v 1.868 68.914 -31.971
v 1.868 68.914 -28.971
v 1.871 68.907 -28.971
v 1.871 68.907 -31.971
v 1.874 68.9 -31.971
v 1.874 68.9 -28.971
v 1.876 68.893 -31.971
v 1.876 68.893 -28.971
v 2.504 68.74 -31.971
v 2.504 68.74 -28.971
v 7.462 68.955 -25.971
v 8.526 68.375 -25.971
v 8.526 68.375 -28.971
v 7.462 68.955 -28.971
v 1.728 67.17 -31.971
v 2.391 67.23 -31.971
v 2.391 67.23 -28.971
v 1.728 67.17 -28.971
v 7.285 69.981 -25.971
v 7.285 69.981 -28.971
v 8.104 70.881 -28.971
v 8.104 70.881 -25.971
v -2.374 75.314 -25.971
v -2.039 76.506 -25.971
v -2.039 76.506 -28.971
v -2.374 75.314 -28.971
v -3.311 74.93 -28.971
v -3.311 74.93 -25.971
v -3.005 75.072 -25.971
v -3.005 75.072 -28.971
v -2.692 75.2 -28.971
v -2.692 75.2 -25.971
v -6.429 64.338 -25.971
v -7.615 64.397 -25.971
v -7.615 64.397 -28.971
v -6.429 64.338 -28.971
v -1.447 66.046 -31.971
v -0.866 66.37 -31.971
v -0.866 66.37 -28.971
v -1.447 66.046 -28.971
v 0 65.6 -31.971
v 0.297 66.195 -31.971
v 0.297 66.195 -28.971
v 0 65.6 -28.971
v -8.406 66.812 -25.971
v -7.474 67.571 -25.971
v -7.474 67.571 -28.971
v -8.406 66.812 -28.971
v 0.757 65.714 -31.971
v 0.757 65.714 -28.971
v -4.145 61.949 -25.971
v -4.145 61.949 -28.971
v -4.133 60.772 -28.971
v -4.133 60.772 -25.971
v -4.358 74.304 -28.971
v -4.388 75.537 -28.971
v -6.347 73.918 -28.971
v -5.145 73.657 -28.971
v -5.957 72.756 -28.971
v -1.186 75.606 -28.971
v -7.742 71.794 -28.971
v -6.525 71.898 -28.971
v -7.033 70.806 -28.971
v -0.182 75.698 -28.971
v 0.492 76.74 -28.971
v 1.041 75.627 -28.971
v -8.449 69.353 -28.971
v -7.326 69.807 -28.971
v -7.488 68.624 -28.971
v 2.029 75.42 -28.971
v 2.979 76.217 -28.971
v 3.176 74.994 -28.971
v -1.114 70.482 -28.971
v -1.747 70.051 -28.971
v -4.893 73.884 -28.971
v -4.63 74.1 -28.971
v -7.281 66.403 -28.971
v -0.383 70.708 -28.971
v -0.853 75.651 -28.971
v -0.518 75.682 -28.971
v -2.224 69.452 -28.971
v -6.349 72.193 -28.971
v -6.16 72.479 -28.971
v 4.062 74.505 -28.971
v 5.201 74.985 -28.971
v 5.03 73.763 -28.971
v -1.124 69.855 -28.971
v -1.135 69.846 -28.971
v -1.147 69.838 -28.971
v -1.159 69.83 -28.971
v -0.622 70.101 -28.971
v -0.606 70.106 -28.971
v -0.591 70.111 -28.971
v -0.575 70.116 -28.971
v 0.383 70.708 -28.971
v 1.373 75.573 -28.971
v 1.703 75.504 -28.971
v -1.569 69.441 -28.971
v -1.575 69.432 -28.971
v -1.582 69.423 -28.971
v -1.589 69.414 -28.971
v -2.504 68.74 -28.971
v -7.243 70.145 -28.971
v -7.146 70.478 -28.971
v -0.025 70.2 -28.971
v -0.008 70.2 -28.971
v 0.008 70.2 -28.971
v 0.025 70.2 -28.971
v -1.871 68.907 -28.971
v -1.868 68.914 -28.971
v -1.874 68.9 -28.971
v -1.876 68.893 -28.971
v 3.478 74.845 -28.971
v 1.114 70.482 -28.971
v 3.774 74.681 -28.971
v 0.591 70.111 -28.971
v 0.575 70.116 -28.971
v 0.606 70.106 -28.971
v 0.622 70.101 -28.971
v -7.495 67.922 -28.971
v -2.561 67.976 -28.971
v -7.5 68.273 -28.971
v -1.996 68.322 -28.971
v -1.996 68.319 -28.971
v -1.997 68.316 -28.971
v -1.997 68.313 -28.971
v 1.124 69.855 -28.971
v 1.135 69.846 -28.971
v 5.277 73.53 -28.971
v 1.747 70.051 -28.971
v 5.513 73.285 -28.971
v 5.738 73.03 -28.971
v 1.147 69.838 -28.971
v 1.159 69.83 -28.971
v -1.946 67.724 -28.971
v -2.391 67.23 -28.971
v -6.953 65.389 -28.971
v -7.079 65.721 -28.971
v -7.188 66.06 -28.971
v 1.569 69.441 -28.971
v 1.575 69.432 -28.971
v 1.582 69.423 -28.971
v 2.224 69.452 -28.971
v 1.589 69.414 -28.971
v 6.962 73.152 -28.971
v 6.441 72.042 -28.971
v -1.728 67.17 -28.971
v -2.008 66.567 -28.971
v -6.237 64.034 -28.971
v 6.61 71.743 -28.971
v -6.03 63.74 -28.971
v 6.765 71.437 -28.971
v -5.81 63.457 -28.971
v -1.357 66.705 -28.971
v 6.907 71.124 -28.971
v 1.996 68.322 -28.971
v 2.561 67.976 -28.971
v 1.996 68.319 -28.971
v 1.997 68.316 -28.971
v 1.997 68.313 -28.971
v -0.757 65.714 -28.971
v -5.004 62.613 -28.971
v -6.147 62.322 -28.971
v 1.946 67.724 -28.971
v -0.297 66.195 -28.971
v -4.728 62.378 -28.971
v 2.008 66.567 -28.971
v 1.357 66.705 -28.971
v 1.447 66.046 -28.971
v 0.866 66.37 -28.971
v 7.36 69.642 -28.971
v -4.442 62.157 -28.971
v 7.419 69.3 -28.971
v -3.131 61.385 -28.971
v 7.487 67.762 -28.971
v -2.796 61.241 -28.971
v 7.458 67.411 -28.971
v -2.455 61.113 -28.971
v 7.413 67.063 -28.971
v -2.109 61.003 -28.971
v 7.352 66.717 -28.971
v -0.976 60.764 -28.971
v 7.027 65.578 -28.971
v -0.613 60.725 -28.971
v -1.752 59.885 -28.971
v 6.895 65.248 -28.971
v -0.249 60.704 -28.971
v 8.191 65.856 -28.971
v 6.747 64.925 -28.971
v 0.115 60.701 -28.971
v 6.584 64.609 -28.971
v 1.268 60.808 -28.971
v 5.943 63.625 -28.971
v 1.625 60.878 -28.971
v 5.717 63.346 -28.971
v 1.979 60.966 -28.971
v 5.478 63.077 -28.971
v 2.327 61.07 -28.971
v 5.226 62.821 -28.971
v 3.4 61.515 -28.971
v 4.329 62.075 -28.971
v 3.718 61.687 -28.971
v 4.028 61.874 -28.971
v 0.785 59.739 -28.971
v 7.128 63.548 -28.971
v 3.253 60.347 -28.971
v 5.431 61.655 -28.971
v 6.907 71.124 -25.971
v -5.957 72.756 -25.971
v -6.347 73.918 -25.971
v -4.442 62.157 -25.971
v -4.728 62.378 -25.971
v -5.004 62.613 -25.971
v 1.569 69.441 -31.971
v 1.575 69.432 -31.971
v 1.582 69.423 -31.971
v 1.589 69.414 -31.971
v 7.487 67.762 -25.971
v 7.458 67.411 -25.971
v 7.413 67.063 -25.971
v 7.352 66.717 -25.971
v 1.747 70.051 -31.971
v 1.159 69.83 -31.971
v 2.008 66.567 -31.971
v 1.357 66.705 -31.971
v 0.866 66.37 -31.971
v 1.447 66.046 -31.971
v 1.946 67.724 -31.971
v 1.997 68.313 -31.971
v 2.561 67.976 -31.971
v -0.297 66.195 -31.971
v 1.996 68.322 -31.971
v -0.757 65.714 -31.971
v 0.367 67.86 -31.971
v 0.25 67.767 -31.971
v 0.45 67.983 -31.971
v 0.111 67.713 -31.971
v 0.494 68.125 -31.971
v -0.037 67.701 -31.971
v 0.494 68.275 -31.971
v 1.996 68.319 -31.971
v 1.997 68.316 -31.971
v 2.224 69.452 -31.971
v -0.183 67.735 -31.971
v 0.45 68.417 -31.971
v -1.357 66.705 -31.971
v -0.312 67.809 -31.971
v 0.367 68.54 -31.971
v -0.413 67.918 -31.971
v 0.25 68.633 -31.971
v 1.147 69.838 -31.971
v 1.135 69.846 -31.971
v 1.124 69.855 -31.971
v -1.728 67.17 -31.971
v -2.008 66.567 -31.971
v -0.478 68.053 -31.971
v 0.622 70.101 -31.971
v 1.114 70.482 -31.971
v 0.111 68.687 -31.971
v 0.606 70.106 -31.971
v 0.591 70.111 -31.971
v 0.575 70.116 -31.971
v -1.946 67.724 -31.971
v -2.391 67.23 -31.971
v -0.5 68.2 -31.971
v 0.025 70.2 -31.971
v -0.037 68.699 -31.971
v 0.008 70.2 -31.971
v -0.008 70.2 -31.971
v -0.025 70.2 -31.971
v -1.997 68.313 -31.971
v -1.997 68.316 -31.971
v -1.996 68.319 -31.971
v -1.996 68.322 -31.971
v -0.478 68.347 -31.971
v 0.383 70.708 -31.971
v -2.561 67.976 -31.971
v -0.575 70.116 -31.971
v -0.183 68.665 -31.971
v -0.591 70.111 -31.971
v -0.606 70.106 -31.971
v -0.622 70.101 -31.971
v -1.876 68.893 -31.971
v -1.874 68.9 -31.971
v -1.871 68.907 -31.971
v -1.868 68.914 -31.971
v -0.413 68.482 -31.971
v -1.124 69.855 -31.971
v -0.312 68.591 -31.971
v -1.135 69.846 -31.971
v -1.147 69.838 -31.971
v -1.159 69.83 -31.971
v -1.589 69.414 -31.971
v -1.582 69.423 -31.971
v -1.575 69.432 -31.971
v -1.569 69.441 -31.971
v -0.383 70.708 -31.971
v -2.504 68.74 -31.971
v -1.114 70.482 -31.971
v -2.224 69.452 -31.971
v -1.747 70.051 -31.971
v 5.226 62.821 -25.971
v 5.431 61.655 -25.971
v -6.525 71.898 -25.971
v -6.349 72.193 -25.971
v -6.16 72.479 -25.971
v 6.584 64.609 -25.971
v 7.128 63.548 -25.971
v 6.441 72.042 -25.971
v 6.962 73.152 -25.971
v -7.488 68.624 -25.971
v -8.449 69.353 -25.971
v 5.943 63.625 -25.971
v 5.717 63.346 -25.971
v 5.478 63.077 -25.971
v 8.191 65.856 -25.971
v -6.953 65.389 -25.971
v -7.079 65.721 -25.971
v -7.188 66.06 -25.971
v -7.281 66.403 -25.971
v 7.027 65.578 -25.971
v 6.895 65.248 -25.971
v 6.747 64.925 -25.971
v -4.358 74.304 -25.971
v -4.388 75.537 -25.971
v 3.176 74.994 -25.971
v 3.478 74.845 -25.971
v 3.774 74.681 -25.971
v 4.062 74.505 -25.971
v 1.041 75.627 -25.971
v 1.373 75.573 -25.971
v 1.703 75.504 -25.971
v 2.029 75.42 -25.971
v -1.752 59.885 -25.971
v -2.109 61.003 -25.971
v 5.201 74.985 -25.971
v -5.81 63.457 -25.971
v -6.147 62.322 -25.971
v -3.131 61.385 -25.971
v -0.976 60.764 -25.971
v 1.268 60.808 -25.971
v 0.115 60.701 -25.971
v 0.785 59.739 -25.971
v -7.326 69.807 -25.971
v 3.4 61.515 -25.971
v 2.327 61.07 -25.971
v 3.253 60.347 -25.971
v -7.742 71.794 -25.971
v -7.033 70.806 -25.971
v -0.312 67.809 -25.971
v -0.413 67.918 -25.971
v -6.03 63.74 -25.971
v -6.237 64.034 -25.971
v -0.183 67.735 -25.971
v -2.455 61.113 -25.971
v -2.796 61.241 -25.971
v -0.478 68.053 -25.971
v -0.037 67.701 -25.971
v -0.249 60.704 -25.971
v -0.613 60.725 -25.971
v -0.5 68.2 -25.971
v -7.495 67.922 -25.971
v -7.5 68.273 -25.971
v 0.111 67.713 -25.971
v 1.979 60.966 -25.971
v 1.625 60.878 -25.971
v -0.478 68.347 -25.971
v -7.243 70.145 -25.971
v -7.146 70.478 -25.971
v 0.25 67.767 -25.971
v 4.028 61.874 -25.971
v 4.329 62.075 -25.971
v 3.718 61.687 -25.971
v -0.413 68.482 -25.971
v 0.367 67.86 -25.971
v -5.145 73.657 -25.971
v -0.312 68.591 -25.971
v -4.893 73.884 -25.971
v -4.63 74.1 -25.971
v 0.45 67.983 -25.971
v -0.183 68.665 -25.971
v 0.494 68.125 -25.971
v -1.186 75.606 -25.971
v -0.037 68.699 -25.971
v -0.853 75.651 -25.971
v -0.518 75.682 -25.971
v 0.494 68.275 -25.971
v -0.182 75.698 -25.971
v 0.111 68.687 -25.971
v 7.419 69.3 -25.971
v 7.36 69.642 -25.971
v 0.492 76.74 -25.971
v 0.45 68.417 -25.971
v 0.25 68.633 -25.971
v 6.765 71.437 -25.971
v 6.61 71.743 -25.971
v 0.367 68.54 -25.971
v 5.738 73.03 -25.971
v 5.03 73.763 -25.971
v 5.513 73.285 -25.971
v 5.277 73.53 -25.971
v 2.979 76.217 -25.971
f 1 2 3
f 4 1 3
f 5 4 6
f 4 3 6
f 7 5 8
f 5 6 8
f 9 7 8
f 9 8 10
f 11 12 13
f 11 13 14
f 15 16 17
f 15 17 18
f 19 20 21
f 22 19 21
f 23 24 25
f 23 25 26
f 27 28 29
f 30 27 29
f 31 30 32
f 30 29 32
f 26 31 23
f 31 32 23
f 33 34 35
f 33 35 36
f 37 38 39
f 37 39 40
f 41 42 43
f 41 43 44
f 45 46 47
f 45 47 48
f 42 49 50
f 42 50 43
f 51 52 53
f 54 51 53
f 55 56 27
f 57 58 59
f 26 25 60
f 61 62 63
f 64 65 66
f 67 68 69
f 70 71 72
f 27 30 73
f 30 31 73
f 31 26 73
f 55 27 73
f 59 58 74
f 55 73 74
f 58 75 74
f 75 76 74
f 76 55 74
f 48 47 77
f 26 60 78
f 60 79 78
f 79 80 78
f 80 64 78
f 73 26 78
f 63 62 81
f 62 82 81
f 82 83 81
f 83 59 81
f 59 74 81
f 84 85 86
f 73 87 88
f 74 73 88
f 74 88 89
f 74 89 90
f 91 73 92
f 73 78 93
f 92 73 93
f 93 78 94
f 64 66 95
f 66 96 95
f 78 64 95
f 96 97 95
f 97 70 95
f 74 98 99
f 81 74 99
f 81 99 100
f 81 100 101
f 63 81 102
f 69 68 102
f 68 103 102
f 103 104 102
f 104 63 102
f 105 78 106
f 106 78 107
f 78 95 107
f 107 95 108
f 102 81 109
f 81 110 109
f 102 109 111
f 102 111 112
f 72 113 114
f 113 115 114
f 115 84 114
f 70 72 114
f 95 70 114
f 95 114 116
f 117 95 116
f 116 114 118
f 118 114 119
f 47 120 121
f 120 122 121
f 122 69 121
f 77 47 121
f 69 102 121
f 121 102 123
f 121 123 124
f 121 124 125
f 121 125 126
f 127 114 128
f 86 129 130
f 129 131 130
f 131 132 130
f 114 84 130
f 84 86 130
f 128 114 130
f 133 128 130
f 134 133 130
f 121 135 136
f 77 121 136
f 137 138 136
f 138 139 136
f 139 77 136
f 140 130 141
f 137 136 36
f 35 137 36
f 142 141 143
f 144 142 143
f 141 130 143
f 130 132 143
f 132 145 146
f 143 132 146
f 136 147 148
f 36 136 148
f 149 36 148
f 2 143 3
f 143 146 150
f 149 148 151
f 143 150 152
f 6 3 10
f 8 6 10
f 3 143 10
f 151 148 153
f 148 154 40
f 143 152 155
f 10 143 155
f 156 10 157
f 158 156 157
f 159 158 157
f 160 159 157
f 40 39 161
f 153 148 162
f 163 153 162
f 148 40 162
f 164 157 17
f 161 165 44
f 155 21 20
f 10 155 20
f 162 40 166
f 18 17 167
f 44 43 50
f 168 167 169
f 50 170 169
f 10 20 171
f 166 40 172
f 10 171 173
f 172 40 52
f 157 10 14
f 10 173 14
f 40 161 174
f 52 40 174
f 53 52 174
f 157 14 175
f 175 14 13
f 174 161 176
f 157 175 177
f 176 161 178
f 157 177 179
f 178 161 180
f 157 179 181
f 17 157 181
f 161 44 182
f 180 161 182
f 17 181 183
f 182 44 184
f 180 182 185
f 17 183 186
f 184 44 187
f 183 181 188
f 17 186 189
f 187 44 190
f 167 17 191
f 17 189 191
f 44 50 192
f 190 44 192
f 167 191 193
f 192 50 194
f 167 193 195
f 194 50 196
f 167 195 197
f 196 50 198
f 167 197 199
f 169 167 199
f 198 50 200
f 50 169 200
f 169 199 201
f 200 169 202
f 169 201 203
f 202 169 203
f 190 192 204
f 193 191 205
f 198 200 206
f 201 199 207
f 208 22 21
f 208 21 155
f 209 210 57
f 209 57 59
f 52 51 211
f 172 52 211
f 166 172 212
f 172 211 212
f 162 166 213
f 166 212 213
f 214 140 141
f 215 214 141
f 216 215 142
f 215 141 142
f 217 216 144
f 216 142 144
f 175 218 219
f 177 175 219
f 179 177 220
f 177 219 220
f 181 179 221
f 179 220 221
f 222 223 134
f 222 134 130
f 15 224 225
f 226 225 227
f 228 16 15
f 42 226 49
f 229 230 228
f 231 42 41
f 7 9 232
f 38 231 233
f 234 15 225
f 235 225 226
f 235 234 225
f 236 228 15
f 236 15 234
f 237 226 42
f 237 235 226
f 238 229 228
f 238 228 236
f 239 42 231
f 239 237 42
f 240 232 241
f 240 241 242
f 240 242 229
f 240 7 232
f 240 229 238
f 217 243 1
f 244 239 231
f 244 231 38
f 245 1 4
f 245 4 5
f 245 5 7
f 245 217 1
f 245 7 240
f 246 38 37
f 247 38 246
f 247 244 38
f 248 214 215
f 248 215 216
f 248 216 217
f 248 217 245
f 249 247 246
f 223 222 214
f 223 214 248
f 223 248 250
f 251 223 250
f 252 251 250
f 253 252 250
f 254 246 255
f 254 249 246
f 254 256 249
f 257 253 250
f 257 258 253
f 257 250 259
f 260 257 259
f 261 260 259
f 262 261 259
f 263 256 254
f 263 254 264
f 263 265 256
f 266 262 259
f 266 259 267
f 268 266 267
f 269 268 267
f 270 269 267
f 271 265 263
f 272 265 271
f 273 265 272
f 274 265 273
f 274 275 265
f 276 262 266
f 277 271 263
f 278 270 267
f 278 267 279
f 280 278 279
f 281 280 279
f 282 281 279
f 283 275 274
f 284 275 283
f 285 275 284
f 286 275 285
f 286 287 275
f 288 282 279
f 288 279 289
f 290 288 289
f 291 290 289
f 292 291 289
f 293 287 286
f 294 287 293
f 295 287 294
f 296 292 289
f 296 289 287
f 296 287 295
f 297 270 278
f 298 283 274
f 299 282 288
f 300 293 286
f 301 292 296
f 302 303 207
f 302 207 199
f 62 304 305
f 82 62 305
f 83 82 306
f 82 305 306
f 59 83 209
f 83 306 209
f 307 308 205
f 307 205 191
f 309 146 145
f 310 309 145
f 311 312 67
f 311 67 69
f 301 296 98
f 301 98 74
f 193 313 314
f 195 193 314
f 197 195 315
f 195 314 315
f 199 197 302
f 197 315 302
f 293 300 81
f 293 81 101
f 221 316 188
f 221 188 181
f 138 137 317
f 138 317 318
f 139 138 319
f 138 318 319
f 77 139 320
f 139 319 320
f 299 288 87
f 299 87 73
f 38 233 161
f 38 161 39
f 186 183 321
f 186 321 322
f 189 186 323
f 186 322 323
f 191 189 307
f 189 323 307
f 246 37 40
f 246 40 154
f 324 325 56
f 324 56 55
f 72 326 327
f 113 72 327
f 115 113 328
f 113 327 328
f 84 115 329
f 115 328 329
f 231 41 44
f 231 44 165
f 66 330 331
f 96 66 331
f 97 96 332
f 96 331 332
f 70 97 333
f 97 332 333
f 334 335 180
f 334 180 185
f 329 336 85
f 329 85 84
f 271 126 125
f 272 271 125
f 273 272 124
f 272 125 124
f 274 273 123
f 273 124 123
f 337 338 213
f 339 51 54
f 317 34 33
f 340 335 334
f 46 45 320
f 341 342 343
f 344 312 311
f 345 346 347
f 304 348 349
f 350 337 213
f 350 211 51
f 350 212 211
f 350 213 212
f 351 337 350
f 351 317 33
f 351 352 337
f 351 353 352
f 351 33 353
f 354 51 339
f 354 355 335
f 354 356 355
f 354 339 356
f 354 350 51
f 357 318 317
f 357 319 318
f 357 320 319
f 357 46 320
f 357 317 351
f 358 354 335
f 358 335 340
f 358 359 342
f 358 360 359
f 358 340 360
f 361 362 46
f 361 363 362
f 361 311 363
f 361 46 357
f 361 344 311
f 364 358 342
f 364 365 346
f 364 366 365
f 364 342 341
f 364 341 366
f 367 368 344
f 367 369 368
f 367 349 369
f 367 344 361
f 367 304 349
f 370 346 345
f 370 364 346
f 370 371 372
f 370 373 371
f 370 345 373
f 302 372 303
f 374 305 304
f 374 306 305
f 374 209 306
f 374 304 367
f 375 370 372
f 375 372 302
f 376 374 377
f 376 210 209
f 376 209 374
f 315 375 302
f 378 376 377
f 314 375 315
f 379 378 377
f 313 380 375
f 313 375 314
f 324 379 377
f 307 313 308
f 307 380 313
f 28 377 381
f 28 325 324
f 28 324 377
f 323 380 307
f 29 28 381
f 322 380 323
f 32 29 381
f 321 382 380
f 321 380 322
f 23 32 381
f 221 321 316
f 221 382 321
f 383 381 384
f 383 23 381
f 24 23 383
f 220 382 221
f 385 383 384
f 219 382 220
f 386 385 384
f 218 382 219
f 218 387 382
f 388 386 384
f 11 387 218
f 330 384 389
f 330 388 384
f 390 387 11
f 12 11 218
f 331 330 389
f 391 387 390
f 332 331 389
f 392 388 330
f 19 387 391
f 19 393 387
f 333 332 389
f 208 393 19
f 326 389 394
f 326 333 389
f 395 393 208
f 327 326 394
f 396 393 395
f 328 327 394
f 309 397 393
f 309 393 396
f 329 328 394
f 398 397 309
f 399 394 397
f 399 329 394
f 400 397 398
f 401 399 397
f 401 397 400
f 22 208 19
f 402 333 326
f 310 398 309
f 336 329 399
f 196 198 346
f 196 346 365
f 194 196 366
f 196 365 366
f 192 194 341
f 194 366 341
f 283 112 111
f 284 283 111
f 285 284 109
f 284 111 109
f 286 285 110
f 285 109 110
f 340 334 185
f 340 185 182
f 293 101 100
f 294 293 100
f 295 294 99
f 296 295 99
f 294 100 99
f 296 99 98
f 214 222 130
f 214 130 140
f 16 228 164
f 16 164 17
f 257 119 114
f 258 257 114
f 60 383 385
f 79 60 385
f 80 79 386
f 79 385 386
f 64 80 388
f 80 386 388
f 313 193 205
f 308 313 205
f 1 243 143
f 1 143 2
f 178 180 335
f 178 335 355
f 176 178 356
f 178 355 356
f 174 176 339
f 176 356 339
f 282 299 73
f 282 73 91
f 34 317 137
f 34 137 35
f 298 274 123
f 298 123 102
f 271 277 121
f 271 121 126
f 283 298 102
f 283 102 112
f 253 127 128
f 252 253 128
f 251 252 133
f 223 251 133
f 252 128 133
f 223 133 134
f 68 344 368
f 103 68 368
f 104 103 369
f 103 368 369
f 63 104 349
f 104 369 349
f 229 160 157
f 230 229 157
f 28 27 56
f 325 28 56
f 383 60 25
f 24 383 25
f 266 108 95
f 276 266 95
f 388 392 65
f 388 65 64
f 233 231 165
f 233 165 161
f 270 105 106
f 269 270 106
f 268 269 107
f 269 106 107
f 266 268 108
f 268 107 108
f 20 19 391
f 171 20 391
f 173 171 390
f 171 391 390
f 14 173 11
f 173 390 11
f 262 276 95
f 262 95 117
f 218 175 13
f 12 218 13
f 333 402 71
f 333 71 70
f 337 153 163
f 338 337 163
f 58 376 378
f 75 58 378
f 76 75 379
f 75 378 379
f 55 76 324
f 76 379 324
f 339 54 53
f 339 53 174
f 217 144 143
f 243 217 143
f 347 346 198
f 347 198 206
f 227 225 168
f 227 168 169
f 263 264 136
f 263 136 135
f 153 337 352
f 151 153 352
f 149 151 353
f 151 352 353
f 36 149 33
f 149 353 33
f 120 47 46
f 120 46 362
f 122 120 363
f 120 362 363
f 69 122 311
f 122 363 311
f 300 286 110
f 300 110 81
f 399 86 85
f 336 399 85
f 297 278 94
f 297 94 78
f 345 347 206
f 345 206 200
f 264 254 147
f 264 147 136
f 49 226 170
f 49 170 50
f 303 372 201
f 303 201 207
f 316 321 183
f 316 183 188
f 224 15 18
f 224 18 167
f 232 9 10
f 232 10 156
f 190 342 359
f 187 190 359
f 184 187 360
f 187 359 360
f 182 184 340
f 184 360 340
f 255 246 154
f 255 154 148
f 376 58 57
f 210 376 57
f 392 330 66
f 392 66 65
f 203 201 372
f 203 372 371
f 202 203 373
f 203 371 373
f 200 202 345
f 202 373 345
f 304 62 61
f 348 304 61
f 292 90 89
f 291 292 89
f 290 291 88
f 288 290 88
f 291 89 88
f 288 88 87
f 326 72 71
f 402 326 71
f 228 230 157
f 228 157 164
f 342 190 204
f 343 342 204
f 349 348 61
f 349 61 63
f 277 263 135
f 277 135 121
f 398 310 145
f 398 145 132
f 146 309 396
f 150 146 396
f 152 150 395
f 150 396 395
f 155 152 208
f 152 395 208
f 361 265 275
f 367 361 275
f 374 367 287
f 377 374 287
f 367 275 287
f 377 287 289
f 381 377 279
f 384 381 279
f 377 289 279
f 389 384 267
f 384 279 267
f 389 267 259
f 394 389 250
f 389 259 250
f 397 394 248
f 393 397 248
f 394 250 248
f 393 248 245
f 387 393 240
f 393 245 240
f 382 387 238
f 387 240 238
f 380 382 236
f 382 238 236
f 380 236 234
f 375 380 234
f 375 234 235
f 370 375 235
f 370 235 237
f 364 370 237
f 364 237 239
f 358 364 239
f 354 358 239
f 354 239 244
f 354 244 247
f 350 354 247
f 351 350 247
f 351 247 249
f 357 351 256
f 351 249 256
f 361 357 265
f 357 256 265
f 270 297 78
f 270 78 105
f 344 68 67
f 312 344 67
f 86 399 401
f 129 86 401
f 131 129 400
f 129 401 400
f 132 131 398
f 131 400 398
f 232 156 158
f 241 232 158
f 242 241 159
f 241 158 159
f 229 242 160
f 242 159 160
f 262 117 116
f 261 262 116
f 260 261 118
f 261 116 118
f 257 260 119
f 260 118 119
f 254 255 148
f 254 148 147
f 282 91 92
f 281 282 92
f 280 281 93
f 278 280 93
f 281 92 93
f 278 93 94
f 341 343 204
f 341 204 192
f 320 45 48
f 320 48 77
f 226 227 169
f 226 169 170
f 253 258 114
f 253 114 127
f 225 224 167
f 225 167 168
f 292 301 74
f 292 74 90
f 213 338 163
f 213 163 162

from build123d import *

# Parameters (mm, degrees)
BOSS_EXTRUDE1_DEPTH = 3
BOSS_EXTRUDE3_DEPTH = 3
CIRPATTERN1_COUNT   = 21
SKETCH7_R           = 2
BOSS_EXTRUDE4_DEPTH = 3
BOSS_EXTRUDE5_DEPTH = 3
CIRPATTERN2_COUNT   = 21
SKETCH9_R           = 0.5
CUT_EXTRUDE1_DEPTH  = 6


with BuildPart() as part:
    # Sketch3 → Boss-Extrude1 (new body)
    with BuildSketch(Plane(origin=(0, 0, -25.970633743), x_dir=(-1, 0, 0), z_dir=(0, 0, -1))):
        with BuildLine():
            ThreePointArc((-1.041352606, 75.627353819), (0.431341592, 60.712413978), (0.181550718, 75.6978023))
            Line((0.181550718, 75.6978023), (-1.041352606, 75.627353819))
        make_face()
    extrude(amount=BOSS_EXTRUDE1_DEPTH)

    # Sketch5 → Boss-Extrude3 (add)
    with BuildSketch(Plane.XY.offset(-25.970633743)):
        Polygon((-0.181550718, 75.6978023), (1.041352606, 75.627353819), (0.491951555, 76.73970416), align=None)
    boss_extrude3 = extrude(amount=-BOSS_EXTRUDE3_DEPTH)

    # CirPattern1: Boss-Extrude3 ×21 about axis
    cirpattern1_axis = Axis((0.001629139, 68.228279947, 0), (0, 0, 1))
    for i in range(1, CIRPATTERN1_COUNT):
        add(boss_extrude3.rotate(cirpattern1_axis, i * 360 / CIRPATTERN1_COUNT))

    # Sketch7 → Boss-Extrude4 (add)
    with BuildSketch(Plane(origin=(0, 0, -28.970633743), x_dir=(-1, 0, 0), z_dir=(0, 0, -1))):
        with Locations((0, 68.2)):
            Circle(SKETCH7_R)
    extrude(amount=BOSS_EXTRUDE4_DEPTH)

    # Sketch8 → Boss-Extrude5 (add)
    with BuildSketch(Plane(origin=(0, 0, -31.970633743), x_dir=(-1, 0, 0), z_dir=(0, 0, -1))):
        Polygon((0.4, 66.4), (-0.4, 66.4), (0, 65.6), align=None)
    boss_extrude5 = extrude(amount=-BOSS_EXTRUDE5_DEPTH)

    # CirPattern2: Boss-Extrude5 ×21 about axis
    cirpattern2_axis = Axis((0, 68.168195033, 0), (0, 0, 1))
    for i in range(1, CIRPATTERN2_COUNT):
        add(boss_extrude5.rotate(cirpattern2_axis, i * 360 / CIRPATTERN2_COUNT))

    # Sketch9 → Cut-Extrude1 (cut)
    with BuildSketch(Plane(origin=(0, 0, -31.970633743), x_dir=(-1, 0, 0), z_dir=(0, 0, -1))):
        with Locations((0, 68.2)):
            Circle(SKETCH9_R)
    extrude(amount=-CUT_EXTRUDE1_DEPTH, mode=Mode.SUBTRACT)


solid = part.part
